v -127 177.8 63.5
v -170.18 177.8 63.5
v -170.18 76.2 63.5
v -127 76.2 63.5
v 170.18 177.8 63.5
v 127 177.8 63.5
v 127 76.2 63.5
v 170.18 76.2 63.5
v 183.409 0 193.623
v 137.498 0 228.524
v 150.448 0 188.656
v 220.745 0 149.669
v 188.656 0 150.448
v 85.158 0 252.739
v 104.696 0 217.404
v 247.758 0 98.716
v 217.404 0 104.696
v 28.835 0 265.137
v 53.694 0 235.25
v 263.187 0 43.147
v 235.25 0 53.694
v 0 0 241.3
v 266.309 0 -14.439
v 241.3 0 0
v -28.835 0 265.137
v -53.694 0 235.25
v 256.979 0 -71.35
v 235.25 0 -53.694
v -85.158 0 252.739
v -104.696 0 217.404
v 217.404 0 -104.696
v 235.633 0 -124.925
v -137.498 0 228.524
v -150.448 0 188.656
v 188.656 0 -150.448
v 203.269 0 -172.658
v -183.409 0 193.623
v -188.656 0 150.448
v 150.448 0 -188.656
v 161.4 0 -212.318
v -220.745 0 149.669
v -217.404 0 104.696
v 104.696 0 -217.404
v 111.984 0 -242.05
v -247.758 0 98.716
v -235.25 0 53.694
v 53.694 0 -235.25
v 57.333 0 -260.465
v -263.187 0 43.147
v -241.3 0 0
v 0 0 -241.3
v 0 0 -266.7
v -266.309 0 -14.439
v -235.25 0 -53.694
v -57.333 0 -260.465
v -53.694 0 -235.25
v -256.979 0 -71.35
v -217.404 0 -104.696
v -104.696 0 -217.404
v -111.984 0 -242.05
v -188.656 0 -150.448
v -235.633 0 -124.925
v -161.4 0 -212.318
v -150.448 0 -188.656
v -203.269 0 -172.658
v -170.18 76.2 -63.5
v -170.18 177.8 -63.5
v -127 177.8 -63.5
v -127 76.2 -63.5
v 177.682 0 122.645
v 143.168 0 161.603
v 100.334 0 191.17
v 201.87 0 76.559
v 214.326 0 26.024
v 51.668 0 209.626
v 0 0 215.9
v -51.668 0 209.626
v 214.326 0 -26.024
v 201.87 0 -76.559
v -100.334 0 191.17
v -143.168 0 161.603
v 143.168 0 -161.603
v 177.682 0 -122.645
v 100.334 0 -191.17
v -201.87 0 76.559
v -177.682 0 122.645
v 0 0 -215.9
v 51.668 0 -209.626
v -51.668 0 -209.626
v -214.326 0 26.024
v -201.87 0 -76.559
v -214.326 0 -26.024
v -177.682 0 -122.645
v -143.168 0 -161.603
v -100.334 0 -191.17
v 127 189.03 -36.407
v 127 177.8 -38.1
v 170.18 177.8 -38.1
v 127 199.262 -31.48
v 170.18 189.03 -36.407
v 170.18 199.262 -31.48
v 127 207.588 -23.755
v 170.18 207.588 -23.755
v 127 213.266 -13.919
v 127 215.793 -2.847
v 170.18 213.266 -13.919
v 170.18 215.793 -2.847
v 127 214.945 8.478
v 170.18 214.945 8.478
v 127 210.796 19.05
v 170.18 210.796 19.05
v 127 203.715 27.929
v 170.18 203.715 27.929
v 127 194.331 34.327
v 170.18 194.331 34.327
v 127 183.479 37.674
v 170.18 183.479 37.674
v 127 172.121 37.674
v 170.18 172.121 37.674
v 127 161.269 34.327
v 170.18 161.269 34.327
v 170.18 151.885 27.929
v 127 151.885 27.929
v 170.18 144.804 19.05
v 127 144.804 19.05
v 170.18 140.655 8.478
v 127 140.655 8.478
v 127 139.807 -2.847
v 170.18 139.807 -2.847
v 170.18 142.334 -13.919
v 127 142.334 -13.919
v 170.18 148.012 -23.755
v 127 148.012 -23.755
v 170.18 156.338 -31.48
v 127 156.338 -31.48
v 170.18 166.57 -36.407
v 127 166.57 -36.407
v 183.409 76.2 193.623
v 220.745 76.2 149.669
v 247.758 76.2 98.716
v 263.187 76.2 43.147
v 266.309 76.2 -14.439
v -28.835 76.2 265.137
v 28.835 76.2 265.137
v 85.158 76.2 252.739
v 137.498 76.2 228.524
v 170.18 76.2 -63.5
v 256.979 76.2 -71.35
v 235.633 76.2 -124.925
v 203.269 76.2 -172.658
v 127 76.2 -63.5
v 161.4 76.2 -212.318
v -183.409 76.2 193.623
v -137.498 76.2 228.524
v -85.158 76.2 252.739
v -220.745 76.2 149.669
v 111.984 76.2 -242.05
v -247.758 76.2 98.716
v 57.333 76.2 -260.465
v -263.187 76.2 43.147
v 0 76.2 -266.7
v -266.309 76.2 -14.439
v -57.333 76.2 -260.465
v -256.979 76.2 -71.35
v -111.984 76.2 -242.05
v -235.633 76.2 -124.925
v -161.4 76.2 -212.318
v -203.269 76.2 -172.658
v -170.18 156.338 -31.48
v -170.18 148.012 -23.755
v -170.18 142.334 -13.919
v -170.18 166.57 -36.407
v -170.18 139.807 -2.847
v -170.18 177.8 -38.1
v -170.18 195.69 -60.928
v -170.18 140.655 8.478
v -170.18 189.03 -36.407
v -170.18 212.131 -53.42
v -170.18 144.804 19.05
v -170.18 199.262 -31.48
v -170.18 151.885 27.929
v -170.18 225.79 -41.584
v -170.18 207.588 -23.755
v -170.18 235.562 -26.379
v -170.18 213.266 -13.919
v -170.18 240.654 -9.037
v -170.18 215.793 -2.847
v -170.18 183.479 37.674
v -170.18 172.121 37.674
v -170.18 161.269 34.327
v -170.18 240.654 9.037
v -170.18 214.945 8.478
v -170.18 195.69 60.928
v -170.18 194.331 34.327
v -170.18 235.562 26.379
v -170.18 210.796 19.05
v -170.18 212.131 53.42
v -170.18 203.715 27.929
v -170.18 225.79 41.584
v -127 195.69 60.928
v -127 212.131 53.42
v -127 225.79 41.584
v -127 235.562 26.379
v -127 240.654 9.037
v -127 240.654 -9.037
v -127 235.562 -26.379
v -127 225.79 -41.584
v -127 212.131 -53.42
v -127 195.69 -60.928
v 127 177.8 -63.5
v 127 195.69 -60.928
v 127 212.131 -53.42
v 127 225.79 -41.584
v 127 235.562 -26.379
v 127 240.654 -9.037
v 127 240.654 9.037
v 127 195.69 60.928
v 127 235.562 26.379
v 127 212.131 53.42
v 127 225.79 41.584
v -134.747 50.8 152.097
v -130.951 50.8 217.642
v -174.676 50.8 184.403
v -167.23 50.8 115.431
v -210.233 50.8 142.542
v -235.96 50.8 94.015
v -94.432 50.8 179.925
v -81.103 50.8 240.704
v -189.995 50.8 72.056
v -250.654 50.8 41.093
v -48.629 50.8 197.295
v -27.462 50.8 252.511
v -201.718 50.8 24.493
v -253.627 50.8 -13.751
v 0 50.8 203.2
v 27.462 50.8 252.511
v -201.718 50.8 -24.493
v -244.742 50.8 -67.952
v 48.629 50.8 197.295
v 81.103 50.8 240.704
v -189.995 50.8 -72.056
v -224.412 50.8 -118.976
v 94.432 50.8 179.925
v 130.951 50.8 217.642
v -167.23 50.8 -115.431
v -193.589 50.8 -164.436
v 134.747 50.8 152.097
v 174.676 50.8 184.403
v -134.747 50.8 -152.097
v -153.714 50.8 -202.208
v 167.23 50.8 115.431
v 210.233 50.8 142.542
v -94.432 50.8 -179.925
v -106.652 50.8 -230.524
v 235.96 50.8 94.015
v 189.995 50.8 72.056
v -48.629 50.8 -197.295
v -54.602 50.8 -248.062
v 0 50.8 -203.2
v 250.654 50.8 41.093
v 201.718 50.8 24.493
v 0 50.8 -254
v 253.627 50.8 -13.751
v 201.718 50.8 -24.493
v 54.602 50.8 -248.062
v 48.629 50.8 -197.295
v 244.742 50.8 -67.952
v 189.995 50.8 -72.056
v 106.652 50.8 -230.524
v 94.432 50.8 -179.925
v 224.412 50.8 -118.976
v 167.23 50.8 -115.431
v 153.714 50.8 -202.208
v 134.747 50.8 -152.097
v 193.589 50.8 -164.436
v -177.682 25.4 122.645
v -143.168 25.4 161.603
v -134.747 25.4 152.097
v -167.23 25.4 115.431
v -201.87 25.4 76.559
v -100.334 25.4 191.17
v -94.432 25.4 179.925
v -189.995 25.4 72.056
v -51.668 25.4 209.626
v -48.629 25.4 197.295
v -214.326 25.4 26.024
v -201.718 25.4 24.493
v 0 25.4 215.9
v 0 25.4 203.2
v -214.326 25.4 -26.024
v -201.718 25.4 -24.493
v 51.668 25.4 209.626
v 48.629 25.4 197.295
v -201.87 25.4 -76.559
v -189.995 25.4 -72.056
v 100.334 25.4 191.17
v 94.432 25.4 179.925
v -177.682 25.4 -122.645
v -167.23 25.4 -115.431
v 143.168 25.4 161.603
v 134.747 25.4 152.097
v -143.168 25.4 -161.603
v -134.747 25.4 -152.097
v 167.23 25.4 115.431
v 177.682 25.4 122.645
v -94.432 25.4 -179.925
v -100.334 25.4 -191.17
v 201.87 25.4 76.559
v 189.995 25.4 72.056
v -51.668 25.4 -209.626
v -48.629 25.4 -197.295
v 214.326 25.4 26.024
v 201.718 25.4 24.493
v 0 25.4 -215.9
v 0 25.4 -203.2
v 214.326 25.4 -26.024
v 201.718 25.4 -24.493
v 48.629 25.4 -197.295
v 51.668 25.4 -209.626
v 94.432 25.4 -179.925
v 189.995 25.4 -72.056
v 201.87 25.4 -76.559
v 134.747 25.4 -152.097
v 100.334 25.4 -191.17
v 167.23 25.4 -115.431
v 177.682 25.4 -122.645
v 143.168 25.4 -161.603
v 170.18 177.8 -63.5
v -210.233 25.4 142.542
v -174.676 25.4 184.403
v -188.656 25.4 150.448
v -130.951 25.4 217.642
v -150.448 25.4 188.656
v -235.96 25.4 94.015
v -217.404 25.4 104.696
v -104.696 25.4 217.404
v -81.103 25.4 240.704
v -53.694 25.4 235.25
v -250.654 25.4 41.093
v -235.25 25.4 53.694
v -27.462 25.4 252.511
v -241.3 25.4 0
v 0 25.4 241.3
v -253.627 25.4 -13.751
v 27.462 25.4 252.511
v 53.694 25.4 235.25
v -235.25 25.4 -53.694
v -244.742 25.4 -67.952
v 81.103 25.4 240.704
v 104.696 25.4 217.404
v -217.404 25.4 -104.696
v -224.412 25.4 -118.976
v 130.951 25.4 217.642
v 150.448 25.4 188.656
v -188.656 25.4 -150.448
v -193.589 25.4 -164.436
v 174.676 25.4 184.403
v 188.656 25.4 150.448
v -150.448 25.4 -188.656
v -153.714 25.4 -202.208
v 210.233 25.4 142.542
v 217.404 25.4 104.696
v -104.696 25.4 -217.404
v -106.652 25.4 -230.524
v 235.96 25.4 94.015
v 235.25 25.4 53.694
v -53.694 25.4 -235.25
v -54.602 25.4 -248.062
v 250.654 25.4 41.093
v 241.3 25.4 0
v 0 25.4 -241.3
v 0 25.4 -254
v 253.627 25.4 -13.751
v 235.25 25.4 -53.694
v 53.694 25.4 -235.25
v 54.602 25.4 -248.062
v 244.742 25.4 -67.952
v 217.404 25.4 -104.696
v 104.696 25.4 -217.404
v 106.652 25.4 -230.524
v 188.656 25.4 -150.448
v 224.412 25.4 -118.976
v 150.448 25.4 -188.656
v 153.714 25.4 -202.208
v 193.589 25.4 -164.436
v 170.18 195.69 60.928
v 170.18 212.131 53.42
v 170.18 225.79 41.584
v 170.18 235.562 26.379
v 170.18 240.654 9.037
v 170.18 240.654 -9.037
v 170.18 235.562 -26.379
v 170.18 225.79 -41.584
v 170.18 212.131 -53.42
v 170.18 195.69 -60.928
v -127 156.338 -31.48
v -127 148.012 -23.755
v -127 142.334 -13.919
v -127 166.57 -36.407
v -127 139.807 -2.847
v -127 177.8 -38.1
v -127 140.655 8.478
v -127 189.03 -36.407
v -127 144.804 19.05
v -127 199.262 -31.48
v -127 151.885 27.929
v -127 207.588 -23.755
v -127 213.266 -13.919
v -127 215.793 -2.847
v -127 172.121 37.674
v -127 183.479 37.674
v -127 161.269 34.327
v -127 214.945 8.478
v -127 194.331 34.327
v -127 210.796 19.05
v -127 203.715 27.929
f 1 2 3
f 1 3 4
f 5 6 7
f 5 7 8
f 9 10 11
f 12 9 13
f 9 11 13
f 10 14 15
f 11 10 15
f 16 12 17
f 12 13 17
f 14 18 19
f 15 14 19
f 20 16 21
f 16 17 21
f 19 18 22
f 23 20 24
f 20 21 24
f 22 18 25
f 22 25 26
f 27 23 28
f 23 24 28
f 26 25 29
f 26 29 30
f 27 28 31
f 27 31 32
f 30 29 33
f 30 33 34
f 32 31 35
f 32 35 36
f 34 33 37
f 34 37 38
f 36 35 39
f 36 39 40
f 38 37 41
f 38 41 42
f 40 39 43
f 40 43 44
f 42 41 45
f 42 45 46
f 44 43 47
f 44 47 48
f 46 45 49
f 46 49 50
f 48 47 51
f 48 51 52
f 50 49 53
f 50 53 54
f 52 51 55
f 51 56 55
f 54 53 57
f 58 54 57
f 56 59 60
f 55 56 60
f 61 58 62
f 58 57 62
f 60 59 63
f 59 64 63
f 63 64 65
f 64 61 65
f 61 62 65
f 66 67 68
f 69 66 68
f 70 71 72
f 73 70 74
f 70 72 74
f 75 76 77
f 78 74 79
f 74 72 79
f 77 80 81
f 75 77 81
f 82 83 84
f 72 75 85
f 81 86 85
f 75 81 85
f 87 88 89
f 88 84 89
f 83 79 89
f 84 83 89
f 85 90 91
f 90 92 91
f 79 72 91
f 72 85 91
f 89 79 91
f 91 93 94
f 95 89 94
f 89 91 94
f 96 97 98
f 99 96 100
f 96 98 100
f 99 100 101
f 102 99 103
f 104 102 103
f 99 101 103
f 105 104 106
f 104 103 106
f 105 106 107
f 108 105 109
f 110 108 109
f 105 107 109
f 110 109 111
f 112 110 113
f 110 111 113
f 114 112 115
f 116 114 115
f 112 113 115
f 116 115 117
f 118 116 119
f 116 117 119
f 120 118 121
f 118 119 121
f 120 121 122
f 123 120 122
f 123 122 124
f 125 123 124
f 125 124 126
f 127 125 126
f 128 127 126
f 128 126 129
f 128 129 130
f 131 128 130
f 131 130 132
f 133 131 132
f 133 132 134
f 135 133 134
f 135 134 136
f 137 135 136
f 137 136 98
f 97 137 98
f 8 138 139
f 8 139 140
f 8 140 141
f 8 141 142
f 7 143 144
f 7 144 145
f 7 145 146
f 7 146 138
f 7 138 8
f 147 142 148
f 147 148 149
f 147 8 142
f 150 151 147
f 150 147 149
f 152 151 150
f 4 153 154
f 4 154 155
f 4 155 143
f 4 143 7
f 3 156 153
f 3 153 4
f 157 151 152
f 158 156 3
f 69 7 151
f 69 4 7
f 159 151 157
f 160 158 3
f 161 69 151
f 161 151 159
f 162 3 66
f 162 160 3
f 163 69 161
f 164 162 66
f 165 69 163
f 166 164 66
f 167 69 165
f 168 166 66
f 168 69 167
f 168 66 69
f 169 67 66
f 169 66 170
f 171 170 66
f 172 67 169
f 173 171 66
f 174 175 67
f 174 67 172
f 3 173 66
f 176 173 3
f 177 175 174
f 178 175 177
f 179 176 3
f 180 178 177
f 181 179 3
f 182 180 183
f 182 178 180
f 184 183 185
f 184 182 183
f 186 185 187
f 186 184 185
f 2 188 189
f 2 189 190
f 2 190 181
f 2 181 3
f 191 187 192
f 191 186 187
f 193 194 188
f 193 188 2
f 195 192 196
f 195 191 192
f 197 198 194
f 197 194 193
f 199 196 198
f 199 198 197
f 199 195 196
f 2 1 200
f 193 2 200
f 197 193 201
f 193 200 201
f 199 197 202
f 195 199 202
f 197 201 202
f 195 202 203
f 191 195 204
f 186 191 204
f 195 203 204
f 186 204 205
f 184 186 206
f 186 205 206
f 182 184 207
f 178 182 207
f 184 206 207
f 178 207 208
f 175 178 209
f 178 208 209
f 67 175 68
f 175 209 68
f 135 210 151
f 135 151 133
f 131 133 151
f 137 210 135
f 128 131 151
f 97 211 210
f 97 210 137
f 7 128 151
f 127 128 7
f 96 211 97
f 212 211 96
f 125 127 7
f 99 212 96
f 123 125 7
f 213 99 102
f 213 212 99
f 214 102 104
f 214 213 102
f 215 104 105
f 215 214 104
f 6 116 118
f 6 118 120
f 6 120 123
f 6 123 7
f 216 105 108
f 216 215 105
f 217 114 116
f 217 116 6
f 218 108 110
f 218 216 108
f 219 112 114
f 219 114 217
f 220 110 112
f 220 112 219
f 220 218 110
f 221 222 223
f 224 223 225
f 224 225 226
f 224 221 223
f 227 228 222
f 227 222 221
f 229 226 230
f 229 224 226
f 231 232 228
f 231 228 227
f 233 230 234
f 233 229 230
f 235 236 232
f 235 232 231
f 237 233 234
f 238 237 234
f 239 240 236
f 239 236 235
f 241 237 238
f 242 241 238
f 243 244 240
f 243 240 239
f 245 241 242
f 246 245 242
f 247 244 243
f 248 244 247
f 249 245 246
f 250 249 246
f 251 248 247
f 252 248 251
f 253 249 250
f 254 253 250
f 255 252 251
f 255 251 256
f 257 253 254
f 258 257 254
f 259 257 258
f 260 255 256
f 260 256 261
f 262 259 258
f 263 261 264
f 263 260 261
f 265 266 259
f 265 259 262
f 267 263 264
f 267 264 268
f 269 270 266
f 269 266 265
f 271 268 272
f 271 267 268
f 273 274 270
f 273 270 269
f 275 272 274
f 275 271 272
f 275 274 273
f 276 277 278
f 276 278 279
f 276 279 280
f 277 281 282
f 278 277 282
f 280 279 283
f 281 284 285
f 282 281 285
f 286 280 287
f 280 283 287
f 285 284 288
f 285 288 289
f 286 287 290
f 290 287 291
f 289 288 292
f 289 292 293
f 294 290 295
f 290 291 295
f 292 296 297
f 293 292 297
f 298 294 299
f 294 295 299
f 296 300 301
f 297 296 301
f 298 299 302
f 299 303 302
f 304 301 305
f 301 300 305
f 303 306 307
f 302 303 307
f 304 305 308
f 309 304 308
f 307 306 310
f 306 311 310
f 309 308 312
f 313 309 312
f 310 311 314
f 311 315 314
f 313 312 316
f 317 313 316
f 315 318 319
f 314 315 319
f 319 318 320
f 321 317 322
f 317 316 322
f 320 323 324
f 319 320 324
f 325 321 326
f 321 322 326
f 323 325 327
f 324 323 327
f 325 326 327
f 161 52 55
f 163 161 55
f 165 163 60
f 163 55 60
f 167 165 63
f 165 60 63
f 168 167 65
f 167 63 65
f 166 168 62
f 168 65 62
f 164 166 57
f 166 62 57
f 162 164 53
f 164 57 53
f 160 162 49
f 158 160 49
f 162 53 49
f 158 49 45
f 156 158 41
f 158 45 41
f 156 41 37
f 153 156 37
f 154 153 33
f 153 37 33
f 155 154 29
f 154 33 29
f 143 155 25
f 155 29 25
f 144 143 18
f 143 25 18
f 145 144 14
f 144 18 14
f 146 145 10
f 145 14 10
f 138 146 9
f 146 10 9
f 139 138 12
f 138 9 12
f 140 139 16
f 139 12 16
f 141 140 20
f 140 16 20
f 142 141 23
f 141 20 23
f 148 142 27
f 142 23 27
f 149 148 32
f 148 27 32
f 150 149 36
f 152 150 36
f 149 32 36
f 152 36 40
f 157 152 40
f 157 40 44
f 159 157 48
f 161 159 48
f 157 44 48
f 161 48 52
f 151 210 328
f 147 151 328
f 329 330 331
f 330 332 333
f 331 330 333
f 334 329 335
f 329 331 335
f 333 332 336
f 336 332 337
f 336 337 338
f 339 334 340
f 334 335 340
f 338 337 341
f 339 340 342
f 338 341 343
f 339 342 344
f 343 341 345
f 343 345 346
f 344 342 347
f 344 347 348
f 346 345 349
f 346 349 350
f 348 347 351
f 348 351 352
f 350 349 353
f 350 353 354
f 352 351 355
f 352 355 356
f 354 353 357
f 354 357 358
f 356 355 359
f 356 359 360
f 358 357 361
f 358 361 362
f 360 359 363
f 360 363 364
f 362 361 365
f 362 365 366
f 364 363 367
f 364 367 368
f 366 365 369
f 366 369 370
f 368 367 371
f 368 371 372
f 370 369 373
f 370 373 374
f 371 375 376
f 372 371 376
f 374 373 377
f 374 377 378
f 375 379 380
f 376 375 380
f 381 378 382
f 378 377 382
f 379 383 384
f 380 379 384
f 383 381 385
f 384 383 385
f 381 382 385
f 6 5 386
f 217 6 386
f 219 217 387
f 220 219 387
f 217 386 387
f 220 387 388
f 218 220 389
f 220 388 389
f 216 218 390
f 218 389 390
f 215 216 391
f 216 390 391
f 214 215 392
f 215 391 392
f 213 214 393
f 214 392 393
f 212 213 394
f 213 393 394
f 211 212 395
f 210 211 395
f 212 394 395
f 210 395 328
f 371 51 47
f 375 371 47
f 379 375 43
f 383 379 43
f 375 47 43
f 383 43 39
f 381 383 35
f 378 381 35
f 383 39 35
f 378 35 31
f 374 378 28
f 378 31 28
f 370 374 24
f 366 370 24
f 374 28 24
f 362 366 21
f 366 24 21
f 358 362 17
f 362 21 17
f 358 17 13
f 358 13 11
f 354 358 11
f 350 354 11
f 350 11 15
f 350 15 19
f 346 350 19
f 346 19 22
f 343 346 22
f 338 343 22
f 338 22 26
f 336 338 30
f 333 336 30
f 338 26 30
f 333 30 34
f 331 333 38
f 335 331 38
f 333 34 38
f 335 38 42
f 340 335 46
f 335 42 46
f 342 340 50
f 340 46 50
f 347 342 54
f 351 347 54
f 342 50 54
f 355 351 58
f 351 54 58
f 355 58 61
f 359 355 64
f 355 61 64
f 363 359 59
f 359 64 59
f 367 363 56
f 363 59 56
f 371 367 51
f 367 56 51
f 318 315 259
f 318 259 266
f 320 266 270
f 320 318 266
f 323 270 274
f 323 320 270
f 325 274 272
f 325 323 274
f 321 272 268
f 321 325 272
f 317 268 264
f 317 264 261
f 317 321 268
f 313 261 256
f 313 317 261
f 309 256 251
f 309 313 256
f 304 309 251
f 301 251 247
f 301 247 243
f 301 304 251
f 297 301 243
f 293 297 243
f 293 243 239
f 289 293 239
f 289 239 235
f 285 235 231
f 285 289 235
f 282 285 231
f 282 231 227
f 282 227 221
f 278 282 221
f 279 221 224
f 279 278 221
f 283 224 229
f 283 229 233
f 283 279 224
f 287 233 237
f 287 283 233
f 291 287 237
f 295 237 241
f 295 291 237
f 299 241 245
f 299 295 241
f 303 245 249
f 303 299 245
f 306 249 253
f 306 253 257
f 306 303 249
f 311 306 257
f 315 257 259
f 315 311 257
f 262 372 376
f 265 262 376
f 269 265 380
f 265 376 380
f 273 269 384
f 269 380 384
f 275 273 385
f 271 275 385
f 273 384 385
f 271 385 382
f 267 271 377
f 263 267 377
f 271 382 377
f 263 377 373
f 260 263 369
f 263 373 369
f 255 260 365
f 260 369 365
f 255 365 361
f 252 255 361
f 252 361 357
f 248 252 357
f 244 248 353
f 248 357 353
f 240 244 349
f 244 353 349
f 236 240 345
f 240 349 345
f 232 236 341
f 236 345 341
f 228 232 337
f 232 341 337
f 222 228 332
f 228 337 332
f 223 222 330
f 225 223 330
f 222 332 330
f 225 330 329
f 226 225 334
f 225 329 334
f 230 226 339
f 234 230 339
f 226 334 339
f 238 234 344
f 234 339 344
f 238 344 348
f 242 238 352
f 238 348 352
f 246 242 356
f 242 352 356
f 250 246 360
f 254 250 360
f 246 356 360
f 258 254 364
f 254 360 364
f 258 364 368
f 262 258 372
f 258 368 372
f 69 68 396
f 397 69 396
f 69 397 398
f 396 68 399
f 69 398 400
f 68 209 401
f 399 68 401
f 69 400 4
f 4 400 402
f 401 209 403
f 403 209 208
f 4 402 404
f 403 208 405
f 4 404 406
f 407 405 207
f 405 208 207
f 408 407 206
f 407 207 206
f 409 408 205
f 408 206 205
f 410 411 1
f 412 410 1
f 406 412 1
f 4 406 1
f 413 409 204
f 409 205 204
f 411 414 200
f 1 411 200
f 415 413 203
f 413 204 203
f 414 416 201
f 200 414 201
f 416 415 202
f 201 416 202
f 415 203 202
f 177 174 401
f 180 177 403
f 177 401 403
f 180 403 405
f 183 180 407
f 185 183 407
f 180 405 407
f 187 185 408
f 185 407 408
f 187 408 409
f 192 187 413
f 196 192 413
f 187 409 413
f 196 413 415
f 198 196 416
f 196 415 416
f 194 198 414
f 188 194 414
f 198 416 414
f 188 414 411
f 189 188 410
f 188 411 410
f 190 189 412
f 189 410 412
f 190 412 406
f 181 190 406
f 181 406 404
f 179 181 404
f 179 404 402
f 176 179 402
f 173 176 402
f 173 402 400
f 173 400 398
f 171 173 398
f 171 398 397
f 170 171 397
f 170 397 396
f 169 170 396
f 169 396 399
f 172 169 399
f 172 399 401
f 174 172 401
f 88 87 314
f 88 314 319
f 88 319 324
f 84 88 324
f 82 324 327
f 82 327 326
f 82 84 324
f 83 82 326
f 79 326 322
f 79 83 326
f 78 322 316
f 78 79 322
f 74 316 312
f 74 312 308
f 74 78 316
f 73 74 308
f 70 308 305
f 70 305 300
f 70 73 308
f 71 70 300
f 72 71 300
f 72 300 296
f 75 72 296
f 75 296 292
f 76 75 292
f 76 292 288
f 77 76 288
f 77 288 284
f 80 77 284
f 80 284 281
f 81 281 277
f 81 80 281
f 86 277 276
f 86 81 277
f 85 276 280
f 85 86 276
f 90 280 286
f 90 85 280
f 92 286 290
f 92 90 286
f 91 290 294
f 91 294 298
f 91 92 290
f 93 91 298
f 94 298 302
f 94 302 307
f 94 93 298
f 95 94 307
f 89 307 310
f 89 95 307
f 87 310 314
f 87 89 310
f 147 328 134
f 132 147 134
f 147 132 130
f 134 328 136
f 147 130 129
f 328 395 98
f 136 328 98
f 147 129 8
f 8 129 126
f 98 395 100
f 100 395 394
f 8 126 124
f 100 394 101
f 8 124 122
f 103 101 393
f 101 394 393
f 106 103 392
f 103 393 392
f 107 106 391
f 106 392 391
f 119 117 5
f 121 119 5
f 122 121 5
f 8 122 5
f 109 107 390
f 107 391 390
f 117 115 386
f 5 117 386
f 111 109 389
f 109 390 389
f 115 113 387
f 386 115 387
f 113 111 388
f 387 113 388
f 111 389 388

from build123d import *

# Parameters (mm, degrees)
SKETCH3_R           = 266.7
BOSS_EXTRUDE1_DEPTH = 76.2
SKETCH4_R           = 241.3
SKETCH4_R_2         = 215.9
CUT_EXTRUDE1_DEPTH  = 25.4
SKETCH5_R           = 254
SKETCH5_R_2         = 203.2
CUT_EXTRUDE2_DEPTH  = 25.4
SKETCH6_W           = 43.18
SKETCH6_H           = 127
BOSS_EXTRUDE2_DEPTH = 101.6
BOSS_EXTRUDE3_START = -43.18
BOSS_EXTRUDE3_DEPTH = 43.18
BOSS_EXTRUDE4_DEPTH = 43.18
SKETCH7_R           = 38.1
CUT_EXTRUDE3_DEPTH  = 566.878709972


with BuildPart() as part:
    # Sketch3 → Boss-Extrude1 (new body)
    with BuildSketch(Plane(origin=(0, 0, 0), x_dir=(1, 0, 0), z_dir=(0, 1, 0))):
        with Locations(Location((0, 0, 0), (0, 0, 90))):
            Circle(SKETCH3_R)
    extrude(amount=BOSS_EXTRUDE1_DEPTH)

    # Sketch4 → Cut-Extrude1 (cut)
    with BuildSketch(Plane.XZ):
        with Locations(Location((0, 0, 0), (0, 0, 270))):
            Circle(SKETCH4_R)
        with Locations(Location((0, 0, 0), (0, 0, 270))):
            Circle(SKETCH4_R_2, mode=Mode.SUBTRACT)
    extrude(amount=-CUT_EXTRUDE1_DEPTH, mode=Mode.SUBTRACT)

    # Sketch5 → Cut-Extrude2 (cut)
    with BuildSketch(Plane.XZ.offset(-25.4)):
        with Locations(Location((0, 0, 0), (0, 0, 270))):
            Circle(SKETCH5_R)
        with Locations(Location((0, 0, 0), (0, 0, 270))):
            Circle(SKETCH5_R_2, mode=Mode.SUBTRACT)
    extrude(amount=-CUT_EXTRUDE2_DEPTH, mode=Mode.SUBTRACT)

    # Sketch6 → Boss-Extrude2 (add)
    with BuildSketch(Plane(origin=(0, 76.2, 0), x_dir=(1, 0, 0), z_dir=(0, 1, 0))):
        with Locations((148.59, 0)):
            Rectangle(SKETCH6_W, SKETCH6_H)
        with Locations((-148.59, 0)):
            Rectangle(SKETCH6_W, SKETCH6_H)
    extrude(amount=BOSS_EXTRUDE2_DEPTH)

    # Sketch8 → Boss-Extrude3 (add)
    with BuildSketch(Plane.ZY.offset(170.18).offset(BOSS_EXTRUDE3_START)):
        with BuildLine():
            Line((-63.5, 177.8), (63.5, 177.8))
            ThreePointArc((63.5, 177.8), (0, 241.3), (-63.5, 177.8))
        make_face()
    extrude(amount=BOSS_EXTRUDE3_DEPTH)

    # Sketch10 → Boss-Extrude4 (add)
    with BuildSketch(Plane(origin=(170.18, 0, 0), x_dir=(0, 0, -1), z_dir=(1, 0, 0))):
        with BuildLine():
            Line((63.5, 177.8), (-63.5, 177.8))
            ThreePointArc((-63.5, 177.8), (0, 241.3), (63.5, 177.8))
        make_face()
    extrude(amount=-BOSS_EXTRUDE4_DEPTH)

    # Sketch7 → Cut-Extrude3 (cut, through all)
    with BuildSketch(Plane(origin=(170.18, 0, 0), x_dir=(0, 0, -1), z_dir=(1, 0, 0))):
        with Locations((0, 177.8)):
            Circle(SKETCH7_R)
    extrude(amount=-CUT_EXTRUDE3_DEPTH, mode=Mode.SUBTRACT)


solid = part.part
